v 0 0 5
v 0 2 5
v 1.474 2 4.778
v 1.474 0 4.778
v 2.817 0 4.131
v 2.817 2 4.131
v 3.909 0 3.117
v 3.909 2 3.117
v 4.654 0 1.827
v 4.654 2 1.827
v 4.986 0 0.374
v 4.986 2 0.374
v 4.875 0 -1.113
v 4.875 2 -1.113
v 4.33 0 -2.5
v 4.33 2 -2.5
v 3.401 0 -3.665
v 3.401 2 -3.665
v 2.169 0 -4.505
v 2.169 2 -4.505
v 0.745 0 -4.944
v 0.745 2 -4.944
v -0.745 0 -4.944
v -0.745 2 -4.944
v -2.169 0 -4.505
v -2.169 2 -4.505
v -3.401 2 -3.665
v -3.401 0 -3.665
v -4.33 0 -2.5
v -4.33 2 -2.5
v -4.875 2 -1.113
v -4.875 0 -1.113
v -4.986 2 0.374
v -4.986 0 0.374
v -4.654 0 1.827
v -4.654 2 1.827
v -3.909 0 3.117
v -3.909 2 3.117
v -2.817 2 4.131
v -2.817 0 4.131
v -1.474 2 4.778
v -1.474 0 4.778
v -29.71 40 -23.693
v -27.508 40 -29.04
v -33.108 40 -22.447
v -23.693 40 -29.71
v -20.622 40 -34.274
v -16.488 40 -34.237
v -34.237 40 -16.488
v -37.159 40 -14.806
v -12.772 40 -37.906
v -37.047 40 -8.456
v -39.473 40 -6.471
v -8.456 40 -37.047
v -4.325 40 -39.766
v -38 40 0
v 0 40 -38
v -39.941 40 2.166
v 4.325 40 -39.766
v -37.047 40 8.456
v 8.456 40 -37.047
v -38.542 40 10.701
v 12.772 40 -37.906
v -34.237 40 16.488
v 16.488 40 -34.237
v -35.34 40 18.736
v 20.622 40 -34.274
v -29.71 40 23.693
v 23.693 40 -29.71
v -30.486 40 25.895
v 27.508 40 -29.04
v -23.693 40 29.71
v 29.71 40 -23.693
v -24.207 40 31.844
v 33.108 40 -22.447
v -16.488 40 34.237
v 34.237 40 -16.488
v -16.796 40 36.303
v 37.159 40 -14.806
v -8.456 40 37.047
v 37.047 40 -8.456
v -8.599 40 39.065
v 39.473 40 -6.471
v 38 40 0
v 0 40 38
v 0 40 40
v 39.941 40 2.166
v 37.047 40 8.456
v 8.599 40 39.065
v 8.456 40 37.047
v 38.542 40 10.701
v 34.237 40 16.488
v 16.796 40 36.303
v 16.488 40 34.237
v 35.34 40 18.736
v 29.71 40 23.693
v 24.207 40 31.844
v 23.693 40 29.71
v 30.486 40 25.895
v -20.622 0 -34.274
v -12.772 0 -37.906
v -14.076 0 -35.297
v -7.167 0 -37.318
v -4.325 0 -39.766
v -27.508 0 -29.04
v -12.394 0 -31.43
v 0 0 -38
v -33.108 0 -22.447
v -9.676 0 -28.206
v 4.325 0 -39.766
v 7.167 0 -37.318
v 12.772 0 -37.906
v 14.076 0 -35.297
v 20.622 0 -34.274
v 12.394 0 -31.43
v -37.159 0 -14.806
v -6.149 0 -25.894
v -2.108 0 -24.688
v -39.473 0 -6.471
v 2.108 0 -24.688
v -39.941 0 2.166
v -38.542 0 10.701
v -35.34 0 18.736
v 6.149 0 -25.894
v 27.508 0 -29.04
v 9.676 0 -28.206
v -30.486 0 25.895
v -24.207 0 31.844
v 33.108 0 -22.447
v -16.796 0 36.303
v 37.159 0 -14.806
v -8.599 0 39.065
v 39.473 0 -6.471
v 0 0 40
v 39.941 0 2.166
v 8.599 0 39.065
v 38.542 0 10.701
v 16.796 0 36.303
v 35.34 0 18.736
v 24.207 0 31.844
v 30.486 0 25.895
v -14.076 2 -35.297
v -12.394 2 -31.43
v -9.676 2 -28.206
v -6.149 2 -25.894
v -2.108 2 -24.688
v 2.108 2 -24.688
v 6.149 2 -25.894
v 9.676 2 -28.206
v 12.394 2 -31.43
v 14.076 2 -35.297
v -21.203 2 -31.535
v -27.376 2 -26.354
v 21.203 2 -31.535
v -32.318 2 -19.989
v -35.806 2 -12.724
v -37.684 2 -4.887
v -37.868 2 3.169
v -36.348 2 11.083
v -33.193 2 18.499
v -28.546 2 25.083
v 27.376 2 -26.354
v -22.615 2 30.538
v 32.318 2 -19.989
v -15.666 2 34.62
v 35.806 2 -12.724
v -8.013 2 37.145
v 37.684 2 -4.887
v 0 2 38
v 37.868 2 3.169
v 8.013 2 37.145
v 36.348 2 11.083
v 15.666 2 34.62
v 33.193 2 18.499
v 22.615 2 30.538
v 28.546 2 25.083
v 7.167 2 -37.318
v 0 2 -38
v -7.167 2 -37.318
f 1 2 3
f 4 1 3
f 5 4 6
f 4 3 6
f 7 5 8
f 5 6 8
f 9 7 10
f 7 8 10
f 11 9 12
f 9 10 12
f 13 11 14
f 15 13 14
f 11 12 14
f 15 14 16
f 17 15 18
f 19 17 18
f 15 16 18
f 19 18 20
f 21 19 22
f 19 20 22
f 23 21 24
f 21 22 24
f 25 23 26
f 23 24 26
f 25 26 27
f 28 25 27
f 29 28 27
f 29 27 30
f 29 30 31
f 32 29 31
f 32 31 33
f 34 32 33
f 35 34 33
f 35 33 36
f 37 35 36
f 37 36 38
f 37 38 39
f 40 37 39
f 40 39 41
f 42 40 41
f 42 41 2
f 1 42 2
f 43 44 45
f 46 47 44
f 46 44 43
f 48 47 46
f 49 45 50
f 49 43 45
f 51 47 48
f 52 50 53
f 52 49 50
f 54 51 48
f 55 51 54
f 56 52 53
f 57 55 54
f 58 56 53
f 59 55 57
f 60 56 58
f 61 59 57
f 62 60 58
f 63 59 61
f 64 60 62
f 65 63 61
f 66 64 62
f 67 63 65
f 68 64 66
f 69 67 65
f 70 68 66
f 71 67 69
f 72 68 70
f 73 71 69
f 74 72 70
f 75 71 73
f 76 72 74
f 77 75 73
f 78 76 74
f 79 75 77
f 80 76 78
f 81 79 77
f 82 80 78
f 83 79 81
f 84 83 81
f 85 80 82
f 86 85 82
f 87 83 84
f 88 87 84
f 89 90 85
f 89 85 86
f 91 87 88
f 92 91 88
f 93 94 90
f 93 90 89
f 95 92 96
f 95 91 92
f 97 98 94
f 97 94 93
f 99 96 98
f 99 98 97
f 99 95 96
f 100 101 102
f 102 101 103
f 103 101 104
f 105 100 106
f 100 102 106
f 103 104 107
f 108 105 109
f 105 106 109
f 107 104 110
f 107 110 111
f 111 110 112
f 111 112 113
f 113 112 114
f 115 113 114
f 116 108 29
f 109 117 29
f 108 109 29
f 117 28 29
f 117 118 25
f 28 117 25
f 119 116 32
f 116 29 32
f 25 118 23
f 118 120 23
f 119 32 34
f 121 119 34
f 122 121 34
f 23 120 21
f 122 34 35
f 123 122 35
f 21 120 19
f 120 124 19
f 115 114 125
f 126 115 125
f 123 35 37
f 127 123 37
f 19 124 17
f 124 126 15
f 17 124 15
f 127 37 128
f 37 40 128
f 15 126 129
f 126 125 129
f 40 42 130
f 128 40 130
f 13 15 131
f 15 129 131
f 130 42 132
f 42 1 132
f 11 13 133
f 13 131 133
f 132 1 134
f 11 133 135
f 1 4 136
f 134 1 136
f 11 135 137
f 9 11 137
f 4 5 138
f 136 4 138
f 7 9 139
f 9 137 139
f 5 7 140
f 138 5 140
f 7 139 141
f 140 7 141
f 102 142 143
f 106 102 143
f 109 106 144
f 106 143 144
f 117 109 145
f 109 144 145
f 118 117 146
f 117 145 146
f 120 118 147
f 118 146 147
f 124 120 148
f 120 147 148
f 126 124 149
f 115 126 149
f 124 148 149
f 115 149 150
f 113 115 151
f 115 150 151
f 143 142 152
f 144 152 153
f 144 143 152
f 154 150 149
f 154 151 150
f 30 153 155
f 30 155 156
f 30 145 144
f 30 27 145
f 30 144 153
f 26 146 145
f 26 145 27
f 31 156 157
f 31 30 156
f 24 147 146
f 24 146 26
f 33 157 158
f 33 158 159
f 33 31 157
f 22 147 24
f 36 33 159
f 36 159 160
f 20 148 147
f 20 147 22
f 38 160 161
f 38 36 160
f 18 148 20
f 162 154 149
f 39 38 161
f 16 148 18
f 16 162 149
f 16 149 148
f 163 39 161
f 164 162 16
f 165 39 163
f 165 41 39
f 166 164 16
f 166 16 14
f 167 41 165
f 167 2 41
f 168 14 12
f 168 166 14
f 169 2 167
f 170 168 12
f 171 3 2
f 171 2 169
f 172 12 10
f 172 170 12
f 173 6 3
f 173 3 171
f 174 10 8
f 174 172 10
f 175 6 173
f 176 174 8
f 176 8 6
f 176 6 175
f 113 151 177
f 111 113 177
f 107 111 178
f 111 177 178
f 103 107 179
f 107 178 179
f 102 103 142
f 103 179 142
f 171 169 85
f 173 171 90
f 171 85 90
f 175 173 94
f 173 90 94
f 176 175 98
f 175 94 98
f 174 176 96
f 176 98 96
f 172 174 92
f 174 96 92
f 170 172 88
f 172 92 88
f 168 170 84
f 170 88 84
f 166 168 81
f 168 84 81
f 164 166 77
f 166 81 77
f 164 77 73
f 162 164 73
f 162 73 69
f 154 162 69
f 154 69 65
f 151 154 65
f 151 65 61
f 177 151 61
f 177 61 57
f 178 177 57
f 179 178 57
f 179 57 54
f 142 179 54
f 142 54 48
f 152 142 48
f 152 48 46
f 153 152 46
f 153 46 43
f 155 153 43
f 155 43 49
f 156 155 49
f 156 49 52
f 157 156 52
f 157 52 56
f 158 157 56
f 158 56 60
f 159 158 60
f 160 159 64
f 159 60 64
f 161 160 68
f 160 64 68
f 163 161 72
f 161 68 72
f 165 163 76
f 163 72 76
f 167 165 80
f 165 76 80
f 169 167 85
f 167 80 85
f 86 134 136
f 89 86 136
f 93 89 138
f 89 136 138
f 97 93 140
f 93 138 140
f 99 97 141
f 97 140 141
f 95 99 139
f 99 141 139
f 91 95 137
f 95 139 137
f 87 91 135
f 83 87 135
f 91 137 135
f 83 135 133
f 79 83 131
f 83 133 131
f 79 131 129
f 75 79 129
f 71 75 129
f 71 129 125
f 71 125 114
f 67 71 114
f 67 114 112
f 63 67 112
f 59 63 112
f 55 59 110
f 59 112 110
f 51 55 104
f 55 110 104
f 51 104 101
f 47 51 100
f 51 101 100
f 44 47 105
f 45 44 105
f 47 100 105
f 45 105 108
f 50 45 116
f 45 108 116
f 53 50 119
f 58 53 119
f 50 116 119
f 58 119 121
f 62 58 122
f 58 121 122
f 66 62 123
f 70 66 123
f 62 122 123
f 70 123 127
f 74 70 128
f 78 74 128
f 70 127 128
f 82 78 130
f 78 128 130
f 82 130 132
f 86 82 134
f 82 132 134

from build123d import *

# Parameters (mm, degrees)
SKETCH1_R           = 40
BOSS_EXTRUDE1_DEPTH = 40
SKETCH2_R           = 38
CUT_EXTRUDE1_DEPTH  = 38
CUT_EXTRUDE2_DEPTH  = 38
SKETCH4_R           = 5
CUT_EXTRUDE3_DEPTH  = 38


with BuildPart() as part:
    # Sketch1 → Boss-Extrude1 (new body)
    with BuildSketch(Plane(origin=(0, 0, 0), x_dir=(1, 0, 0), z_dir=(0, 1, 0))):
        with Locations(Location((0, 0, 0), (0, 0, 270))):
            Circle(SKETCH1_R)
    extrude(amount=BOSS_EXTRUDE1_DEPTH)

    # Sketch2 → Cut-Extrude1 (cut)
    with BuildSketch(Plane(origin=(0, 40, 0), x_dir=(1, 0, 0), z_dir=(0, 1, 0))):
        with Locations(Location((0, 0, 0), (0, 0, 270))):
            Circle(SKETCH2_R)
    extrude(amount=-CUT_EXTRUDE1_DEPTH, mode=Mode.SUBTRACT)

    # Sketch3 → Cut-Extrude2 (cut)
    with BuildSketch(Plane(origin=(0, 2, 0), x_dir=(1, 0, 0), z_dir=(0, 1, 0))):
        with BuildLine():
            ThreePointArc((-14.076066703, 35.296803626), (0, 24.534862453), (14.076066703, 35.296803626))
            ThreePointArc((14.076066703, 35.296803626), (0, 38), (-14.076066703, 35.296803626))
        make_face()
    extrude(amount=-CUT_EXTRUDE2_DEPTH, mode=Mode.SUBTRACT)

    # Sketch4 → Cut-Extrude3 (cut)
    with BuildSketch(Plane(origin=(0, 2, 0), x_dir=(1, 0, 0), z_dir=(0, 1, 0))):
        with Locations(Location((0, 0, 0), (0, 0, 270))):
            Circle(SKETCH4_R)
    extrude(amount=-CUT_EXTRUDE3_DEPTH, mode=Mode.SUBTRACT)


solid = part.part
